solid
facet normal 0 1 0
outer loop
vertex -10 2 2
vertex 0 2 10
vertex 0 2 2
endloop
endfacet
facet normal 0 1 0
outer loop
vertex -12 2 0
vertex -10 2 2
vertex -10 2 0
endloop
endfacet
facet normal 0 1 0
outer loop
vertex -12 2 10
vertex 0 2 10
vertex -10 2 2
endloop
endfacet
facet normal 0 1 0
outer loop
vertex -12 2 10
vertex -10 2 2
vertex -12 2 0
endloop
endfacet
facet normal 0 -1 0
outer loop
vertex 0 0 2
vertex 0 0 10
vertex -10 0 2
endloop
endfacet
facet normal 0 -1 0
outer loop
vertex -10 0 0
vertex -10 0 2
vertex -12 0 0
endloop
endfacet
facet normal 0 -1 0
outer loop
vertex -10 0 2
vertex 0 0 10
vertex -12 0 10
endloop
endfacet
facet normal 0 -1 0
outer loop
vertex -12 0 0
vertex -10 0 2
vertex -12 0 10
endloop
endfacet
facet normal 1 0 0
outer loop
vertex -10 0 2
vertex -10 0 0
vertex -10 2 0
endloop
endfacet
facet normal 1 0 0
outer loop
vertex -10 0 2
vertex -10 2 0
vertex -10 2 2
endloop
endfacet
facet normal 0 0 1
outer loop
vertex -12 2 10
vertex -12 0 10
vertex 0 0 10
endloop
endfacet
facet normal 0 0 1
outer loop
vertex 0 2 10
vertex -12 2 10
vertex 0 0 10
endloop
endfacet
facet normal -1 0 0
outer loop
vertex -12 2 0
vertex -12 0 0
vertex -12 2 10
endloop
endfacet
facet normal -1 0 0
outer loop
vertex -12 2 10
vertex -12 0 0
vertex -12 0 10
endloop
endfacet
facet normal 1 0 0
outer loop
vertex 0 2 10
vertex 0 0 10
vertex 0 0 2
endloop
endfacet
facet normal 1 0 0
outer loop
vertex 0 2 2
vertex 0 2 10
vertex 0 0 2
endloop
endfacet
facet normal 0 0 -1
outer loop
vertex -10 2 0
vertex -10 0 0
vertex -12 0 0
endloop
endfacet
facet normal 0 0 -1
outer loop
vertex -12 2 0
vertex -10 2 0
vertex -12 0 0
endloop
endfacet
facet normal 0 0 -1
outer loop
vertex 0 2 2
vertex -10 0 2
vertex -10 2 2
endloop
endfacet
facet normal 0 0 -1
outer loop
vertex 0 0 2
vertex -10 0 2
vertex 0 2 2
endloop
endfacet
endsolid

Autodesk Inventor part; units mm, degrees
ref_plane "YZ Plane" through (0, 0, 0) normal (1, 0, 0) x (0, 1, 0)
ref_plane "XZ Plane" through (0, 0, 0) normal (0, 1, 0) x (-1, 0, 0)
ref_plane "XY Plane" through (0, 0, 0) normal (0, 0, 1) x (1, 0, 0)
sketch "Sketch1" plane through (0, 0, 0) normal (0, 1, 0) x (-1, 0, 0)
  line L0 (0, 0) -> (12, 0)
  line L1 (12, 0) -> (12, 10)
  line L2 (12, 10) -> (0, 10)
  line L3 (0, 10) -> (0, 0)
  line L4 (0, 0) -> (10, 0)
  line L5 (10, 0) -> (10, 2)
  line L6 (10, 2) -> (0, 2)
  line L7 (0, 2) -> (0, 0)
  dimension "d0" = 12
  dimension "d1" = 10
  dimension "d2" = 10
  dimension "d3" = 2
extrude "Extrusion1" add sketch "Sketch1" along normal blind 2 contours L5 L6 L3 L2 L1 L0
properties part number "Bocks"
